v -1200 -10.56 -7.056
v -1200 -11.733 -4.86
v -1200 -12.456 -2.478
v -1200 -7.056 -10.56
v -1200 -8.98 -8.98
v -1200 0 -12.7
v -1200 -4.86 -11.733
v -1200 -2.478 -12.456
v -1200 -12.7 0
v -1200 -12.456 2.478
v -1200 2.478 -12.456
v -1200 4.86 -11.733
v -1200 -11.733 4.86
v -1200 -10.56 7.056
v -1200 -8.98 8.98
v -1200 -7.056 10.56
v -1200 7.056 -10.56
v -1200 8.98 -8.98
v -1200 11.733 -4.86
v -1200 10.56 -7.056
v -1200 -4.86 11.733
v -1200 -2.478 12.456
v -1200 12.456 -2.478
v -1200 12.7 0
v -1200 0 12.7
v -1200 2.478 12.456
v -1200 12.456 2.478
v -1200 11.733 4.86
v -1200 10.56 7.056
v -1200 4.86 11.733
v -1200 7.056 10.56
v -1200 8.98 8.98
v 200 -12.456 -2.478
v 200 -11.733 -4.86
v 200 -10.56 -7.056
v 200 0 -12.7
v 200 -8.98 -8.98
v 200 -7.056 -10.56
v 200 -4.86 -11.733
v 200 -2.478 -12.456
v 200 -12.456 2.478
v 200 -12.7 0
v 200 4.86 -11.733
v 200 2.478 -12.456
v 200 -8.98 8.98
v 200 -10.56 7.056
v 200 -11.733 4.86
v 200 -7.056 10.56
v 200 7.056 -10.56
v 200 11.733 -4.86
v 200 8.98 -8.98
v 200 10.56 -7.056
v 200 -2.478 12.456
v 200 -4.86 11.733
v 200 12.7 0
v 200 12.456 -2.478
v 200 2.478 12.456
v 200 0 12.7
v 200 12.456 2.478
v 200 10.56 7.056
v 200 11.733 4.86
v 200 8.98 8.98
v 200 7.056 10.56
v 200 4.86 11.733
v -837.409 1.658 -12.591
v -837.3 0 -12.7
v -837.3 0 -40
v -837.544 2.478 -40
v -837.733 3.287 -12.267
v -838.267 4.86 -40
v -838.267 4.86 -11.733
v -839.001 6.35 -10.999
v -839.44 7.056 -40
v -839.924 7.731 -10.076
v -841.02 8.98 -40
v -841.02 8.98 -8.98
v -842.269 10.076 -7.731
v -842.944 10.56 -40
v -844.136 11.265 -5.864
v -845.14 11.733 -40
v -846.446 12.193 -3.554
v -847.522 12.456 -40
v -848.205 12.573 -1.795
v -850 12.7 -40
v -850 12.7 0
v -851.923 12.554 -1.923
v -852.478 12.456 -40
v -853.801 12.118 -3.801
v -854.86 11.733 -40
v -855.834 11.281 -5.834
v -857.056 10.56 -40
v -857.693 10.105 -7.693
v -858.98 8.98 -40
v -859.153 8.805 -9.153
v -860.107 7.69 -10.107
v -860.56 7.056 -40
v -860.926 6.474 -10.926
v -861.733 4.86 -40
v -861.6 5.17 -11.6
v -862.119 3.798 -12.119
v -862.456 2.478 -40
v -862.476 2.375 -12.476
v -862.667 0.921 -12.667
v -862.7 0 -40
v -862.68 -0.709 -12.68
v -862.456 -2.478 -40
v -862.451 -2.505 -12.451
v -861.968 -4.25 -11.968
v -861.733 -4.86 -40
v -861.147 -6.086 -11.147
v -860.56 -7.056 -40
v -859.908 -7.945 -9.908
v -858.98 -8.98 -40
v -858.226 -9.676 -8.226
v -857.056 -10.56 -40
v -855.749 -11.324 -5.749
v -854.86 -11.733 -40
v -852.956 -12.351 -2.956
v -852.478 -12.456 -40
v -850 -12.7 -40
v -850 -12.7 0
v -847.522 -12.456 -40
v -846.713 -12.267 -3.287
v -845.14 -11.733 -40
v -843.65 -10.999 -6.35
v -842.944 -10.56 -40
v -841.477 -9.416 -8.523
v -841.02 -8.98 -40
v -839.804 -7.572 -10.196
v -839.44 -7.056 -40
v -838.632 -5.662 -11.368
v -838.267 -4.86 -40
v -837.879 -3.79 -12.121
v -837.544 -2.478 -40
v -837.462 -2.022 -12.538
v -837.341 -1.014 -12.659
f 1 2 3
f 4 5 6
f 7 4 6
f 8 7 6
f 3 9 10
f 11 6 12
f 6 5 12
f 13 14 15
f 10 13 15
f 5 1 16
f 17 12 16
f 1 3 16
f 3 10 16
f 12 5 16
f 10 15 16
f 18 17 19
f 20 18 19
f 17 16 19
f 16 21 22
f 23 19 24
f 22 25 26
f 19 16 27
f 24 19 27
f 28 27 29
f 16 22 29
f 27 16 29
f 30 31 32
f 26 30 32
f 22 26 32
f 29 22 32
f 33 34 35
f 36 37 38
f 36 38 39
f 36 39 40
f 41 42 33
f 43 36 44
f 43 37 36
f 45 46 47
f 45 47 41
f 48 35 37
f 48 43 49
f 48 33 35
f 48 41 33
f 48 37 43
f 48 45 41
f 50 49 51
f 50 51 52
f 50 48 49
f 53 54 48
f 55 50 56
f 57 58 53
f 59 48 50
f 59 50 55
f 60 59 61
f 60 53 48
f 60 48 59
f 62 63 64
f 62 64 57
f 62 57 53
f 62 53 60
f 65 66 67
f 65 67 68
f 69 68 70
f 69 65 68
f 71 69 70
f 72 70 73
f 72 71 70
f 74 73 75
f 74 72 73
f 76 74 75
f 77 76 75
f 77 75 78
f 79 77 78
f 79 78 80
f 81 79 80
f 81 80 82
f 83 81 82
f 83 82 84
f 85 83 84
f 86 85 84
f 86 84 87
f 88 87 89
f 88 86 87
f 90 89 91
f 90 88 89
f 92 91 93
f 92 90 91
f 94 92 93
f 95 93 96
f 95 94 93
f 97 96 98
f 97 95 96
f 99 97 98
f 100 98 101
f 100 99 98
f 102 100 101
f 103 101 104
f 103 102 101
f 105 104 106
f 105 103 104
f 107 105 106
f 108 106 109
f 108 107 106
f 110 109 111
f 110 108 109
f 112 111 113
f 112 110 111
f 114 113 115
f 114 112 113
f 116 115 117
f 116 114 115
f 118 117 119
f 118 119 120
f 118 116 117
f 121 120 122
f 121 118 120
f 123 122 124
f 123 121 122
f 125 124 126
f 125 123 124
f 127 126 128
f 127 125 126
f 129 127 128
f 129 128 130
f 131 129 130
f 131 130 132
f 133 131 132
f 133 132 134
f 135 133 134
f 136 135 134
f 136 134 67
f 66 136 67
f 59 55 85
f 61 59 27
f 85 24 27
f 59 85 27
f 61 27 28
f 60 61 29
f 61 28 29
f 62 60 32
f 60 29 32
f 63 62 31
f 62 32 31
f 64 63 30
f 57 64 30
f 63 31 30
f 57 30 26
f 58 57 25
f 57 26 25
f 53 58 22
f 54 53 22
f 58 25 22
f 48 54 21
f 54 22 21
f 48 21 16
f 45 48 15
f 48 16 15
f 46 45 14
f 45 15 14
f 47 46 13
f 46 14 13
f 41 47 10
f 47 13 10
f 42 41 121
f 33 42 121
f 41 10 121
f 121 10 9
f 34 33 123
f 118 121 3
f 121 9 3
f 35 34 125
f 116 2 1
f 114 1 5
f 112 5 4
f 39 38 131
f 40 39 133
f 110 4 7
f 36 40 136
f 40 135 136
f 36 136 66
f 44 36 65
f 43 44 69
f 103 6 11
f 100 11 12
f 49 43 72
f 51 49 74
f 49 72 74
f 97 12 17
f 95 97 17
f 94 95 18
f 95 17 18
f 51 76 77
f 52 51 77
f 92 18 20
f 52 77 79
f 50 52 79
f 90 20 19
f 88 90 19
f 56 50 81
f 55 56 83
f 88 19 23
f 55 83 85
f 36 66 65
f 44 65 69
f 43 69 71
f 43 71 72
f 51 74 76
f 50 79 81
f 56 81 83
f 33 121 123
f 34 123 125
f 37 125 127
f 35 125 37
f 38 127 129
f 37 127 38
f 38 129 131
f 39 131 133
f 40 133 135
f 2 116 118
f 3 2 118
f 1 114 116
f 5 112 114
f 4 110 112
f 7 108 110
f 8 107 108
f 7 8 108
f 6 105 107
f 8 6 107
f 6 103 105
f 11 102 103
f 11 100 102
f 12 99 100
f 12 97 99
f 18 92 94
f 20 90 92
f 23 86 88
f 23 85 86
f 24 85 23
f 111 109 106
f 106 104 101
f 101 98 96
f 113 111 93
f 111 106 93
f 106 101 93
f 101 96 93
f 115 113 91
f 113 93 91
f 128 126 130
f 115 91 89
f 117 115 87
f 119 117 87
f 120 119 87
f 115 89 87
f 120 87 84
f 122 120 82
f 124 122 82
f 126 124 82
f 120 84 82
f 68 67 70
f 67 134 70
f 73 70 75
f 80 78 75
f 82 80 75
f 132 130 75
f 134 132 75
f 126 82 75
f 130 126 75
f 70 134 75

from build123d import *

# Parameters (mm, degrees)
F0_R     = 12.7
F1_DEPTH = 1200
F2_R     = 12.7
F3_DEPTH = 40
F4_DEPTH = 200


with BuildPart() as f1:
    # F0 (on Right) → F1 (new body)
    with BuildSketch(Plane.YZ):
        Circle(F0_R)
    extrude(amount=-F1_DEPTH)

    # F2 (on Top) → F3 (join)
    with BuildSketch(Plane.XY):
        with Locations((-850, 0)):
            Circle(F2_R)
    extrude(amount=-F3_DEPTH)

    # F4 (add): a face of the model
    f4_faces = [f1.faces().sort_by_distance(p)[0] for p in [
        (0, 0, 0),
    ]]
    extrude(f4_faces, amount=F4_DEPTH)


solid = f1.part
